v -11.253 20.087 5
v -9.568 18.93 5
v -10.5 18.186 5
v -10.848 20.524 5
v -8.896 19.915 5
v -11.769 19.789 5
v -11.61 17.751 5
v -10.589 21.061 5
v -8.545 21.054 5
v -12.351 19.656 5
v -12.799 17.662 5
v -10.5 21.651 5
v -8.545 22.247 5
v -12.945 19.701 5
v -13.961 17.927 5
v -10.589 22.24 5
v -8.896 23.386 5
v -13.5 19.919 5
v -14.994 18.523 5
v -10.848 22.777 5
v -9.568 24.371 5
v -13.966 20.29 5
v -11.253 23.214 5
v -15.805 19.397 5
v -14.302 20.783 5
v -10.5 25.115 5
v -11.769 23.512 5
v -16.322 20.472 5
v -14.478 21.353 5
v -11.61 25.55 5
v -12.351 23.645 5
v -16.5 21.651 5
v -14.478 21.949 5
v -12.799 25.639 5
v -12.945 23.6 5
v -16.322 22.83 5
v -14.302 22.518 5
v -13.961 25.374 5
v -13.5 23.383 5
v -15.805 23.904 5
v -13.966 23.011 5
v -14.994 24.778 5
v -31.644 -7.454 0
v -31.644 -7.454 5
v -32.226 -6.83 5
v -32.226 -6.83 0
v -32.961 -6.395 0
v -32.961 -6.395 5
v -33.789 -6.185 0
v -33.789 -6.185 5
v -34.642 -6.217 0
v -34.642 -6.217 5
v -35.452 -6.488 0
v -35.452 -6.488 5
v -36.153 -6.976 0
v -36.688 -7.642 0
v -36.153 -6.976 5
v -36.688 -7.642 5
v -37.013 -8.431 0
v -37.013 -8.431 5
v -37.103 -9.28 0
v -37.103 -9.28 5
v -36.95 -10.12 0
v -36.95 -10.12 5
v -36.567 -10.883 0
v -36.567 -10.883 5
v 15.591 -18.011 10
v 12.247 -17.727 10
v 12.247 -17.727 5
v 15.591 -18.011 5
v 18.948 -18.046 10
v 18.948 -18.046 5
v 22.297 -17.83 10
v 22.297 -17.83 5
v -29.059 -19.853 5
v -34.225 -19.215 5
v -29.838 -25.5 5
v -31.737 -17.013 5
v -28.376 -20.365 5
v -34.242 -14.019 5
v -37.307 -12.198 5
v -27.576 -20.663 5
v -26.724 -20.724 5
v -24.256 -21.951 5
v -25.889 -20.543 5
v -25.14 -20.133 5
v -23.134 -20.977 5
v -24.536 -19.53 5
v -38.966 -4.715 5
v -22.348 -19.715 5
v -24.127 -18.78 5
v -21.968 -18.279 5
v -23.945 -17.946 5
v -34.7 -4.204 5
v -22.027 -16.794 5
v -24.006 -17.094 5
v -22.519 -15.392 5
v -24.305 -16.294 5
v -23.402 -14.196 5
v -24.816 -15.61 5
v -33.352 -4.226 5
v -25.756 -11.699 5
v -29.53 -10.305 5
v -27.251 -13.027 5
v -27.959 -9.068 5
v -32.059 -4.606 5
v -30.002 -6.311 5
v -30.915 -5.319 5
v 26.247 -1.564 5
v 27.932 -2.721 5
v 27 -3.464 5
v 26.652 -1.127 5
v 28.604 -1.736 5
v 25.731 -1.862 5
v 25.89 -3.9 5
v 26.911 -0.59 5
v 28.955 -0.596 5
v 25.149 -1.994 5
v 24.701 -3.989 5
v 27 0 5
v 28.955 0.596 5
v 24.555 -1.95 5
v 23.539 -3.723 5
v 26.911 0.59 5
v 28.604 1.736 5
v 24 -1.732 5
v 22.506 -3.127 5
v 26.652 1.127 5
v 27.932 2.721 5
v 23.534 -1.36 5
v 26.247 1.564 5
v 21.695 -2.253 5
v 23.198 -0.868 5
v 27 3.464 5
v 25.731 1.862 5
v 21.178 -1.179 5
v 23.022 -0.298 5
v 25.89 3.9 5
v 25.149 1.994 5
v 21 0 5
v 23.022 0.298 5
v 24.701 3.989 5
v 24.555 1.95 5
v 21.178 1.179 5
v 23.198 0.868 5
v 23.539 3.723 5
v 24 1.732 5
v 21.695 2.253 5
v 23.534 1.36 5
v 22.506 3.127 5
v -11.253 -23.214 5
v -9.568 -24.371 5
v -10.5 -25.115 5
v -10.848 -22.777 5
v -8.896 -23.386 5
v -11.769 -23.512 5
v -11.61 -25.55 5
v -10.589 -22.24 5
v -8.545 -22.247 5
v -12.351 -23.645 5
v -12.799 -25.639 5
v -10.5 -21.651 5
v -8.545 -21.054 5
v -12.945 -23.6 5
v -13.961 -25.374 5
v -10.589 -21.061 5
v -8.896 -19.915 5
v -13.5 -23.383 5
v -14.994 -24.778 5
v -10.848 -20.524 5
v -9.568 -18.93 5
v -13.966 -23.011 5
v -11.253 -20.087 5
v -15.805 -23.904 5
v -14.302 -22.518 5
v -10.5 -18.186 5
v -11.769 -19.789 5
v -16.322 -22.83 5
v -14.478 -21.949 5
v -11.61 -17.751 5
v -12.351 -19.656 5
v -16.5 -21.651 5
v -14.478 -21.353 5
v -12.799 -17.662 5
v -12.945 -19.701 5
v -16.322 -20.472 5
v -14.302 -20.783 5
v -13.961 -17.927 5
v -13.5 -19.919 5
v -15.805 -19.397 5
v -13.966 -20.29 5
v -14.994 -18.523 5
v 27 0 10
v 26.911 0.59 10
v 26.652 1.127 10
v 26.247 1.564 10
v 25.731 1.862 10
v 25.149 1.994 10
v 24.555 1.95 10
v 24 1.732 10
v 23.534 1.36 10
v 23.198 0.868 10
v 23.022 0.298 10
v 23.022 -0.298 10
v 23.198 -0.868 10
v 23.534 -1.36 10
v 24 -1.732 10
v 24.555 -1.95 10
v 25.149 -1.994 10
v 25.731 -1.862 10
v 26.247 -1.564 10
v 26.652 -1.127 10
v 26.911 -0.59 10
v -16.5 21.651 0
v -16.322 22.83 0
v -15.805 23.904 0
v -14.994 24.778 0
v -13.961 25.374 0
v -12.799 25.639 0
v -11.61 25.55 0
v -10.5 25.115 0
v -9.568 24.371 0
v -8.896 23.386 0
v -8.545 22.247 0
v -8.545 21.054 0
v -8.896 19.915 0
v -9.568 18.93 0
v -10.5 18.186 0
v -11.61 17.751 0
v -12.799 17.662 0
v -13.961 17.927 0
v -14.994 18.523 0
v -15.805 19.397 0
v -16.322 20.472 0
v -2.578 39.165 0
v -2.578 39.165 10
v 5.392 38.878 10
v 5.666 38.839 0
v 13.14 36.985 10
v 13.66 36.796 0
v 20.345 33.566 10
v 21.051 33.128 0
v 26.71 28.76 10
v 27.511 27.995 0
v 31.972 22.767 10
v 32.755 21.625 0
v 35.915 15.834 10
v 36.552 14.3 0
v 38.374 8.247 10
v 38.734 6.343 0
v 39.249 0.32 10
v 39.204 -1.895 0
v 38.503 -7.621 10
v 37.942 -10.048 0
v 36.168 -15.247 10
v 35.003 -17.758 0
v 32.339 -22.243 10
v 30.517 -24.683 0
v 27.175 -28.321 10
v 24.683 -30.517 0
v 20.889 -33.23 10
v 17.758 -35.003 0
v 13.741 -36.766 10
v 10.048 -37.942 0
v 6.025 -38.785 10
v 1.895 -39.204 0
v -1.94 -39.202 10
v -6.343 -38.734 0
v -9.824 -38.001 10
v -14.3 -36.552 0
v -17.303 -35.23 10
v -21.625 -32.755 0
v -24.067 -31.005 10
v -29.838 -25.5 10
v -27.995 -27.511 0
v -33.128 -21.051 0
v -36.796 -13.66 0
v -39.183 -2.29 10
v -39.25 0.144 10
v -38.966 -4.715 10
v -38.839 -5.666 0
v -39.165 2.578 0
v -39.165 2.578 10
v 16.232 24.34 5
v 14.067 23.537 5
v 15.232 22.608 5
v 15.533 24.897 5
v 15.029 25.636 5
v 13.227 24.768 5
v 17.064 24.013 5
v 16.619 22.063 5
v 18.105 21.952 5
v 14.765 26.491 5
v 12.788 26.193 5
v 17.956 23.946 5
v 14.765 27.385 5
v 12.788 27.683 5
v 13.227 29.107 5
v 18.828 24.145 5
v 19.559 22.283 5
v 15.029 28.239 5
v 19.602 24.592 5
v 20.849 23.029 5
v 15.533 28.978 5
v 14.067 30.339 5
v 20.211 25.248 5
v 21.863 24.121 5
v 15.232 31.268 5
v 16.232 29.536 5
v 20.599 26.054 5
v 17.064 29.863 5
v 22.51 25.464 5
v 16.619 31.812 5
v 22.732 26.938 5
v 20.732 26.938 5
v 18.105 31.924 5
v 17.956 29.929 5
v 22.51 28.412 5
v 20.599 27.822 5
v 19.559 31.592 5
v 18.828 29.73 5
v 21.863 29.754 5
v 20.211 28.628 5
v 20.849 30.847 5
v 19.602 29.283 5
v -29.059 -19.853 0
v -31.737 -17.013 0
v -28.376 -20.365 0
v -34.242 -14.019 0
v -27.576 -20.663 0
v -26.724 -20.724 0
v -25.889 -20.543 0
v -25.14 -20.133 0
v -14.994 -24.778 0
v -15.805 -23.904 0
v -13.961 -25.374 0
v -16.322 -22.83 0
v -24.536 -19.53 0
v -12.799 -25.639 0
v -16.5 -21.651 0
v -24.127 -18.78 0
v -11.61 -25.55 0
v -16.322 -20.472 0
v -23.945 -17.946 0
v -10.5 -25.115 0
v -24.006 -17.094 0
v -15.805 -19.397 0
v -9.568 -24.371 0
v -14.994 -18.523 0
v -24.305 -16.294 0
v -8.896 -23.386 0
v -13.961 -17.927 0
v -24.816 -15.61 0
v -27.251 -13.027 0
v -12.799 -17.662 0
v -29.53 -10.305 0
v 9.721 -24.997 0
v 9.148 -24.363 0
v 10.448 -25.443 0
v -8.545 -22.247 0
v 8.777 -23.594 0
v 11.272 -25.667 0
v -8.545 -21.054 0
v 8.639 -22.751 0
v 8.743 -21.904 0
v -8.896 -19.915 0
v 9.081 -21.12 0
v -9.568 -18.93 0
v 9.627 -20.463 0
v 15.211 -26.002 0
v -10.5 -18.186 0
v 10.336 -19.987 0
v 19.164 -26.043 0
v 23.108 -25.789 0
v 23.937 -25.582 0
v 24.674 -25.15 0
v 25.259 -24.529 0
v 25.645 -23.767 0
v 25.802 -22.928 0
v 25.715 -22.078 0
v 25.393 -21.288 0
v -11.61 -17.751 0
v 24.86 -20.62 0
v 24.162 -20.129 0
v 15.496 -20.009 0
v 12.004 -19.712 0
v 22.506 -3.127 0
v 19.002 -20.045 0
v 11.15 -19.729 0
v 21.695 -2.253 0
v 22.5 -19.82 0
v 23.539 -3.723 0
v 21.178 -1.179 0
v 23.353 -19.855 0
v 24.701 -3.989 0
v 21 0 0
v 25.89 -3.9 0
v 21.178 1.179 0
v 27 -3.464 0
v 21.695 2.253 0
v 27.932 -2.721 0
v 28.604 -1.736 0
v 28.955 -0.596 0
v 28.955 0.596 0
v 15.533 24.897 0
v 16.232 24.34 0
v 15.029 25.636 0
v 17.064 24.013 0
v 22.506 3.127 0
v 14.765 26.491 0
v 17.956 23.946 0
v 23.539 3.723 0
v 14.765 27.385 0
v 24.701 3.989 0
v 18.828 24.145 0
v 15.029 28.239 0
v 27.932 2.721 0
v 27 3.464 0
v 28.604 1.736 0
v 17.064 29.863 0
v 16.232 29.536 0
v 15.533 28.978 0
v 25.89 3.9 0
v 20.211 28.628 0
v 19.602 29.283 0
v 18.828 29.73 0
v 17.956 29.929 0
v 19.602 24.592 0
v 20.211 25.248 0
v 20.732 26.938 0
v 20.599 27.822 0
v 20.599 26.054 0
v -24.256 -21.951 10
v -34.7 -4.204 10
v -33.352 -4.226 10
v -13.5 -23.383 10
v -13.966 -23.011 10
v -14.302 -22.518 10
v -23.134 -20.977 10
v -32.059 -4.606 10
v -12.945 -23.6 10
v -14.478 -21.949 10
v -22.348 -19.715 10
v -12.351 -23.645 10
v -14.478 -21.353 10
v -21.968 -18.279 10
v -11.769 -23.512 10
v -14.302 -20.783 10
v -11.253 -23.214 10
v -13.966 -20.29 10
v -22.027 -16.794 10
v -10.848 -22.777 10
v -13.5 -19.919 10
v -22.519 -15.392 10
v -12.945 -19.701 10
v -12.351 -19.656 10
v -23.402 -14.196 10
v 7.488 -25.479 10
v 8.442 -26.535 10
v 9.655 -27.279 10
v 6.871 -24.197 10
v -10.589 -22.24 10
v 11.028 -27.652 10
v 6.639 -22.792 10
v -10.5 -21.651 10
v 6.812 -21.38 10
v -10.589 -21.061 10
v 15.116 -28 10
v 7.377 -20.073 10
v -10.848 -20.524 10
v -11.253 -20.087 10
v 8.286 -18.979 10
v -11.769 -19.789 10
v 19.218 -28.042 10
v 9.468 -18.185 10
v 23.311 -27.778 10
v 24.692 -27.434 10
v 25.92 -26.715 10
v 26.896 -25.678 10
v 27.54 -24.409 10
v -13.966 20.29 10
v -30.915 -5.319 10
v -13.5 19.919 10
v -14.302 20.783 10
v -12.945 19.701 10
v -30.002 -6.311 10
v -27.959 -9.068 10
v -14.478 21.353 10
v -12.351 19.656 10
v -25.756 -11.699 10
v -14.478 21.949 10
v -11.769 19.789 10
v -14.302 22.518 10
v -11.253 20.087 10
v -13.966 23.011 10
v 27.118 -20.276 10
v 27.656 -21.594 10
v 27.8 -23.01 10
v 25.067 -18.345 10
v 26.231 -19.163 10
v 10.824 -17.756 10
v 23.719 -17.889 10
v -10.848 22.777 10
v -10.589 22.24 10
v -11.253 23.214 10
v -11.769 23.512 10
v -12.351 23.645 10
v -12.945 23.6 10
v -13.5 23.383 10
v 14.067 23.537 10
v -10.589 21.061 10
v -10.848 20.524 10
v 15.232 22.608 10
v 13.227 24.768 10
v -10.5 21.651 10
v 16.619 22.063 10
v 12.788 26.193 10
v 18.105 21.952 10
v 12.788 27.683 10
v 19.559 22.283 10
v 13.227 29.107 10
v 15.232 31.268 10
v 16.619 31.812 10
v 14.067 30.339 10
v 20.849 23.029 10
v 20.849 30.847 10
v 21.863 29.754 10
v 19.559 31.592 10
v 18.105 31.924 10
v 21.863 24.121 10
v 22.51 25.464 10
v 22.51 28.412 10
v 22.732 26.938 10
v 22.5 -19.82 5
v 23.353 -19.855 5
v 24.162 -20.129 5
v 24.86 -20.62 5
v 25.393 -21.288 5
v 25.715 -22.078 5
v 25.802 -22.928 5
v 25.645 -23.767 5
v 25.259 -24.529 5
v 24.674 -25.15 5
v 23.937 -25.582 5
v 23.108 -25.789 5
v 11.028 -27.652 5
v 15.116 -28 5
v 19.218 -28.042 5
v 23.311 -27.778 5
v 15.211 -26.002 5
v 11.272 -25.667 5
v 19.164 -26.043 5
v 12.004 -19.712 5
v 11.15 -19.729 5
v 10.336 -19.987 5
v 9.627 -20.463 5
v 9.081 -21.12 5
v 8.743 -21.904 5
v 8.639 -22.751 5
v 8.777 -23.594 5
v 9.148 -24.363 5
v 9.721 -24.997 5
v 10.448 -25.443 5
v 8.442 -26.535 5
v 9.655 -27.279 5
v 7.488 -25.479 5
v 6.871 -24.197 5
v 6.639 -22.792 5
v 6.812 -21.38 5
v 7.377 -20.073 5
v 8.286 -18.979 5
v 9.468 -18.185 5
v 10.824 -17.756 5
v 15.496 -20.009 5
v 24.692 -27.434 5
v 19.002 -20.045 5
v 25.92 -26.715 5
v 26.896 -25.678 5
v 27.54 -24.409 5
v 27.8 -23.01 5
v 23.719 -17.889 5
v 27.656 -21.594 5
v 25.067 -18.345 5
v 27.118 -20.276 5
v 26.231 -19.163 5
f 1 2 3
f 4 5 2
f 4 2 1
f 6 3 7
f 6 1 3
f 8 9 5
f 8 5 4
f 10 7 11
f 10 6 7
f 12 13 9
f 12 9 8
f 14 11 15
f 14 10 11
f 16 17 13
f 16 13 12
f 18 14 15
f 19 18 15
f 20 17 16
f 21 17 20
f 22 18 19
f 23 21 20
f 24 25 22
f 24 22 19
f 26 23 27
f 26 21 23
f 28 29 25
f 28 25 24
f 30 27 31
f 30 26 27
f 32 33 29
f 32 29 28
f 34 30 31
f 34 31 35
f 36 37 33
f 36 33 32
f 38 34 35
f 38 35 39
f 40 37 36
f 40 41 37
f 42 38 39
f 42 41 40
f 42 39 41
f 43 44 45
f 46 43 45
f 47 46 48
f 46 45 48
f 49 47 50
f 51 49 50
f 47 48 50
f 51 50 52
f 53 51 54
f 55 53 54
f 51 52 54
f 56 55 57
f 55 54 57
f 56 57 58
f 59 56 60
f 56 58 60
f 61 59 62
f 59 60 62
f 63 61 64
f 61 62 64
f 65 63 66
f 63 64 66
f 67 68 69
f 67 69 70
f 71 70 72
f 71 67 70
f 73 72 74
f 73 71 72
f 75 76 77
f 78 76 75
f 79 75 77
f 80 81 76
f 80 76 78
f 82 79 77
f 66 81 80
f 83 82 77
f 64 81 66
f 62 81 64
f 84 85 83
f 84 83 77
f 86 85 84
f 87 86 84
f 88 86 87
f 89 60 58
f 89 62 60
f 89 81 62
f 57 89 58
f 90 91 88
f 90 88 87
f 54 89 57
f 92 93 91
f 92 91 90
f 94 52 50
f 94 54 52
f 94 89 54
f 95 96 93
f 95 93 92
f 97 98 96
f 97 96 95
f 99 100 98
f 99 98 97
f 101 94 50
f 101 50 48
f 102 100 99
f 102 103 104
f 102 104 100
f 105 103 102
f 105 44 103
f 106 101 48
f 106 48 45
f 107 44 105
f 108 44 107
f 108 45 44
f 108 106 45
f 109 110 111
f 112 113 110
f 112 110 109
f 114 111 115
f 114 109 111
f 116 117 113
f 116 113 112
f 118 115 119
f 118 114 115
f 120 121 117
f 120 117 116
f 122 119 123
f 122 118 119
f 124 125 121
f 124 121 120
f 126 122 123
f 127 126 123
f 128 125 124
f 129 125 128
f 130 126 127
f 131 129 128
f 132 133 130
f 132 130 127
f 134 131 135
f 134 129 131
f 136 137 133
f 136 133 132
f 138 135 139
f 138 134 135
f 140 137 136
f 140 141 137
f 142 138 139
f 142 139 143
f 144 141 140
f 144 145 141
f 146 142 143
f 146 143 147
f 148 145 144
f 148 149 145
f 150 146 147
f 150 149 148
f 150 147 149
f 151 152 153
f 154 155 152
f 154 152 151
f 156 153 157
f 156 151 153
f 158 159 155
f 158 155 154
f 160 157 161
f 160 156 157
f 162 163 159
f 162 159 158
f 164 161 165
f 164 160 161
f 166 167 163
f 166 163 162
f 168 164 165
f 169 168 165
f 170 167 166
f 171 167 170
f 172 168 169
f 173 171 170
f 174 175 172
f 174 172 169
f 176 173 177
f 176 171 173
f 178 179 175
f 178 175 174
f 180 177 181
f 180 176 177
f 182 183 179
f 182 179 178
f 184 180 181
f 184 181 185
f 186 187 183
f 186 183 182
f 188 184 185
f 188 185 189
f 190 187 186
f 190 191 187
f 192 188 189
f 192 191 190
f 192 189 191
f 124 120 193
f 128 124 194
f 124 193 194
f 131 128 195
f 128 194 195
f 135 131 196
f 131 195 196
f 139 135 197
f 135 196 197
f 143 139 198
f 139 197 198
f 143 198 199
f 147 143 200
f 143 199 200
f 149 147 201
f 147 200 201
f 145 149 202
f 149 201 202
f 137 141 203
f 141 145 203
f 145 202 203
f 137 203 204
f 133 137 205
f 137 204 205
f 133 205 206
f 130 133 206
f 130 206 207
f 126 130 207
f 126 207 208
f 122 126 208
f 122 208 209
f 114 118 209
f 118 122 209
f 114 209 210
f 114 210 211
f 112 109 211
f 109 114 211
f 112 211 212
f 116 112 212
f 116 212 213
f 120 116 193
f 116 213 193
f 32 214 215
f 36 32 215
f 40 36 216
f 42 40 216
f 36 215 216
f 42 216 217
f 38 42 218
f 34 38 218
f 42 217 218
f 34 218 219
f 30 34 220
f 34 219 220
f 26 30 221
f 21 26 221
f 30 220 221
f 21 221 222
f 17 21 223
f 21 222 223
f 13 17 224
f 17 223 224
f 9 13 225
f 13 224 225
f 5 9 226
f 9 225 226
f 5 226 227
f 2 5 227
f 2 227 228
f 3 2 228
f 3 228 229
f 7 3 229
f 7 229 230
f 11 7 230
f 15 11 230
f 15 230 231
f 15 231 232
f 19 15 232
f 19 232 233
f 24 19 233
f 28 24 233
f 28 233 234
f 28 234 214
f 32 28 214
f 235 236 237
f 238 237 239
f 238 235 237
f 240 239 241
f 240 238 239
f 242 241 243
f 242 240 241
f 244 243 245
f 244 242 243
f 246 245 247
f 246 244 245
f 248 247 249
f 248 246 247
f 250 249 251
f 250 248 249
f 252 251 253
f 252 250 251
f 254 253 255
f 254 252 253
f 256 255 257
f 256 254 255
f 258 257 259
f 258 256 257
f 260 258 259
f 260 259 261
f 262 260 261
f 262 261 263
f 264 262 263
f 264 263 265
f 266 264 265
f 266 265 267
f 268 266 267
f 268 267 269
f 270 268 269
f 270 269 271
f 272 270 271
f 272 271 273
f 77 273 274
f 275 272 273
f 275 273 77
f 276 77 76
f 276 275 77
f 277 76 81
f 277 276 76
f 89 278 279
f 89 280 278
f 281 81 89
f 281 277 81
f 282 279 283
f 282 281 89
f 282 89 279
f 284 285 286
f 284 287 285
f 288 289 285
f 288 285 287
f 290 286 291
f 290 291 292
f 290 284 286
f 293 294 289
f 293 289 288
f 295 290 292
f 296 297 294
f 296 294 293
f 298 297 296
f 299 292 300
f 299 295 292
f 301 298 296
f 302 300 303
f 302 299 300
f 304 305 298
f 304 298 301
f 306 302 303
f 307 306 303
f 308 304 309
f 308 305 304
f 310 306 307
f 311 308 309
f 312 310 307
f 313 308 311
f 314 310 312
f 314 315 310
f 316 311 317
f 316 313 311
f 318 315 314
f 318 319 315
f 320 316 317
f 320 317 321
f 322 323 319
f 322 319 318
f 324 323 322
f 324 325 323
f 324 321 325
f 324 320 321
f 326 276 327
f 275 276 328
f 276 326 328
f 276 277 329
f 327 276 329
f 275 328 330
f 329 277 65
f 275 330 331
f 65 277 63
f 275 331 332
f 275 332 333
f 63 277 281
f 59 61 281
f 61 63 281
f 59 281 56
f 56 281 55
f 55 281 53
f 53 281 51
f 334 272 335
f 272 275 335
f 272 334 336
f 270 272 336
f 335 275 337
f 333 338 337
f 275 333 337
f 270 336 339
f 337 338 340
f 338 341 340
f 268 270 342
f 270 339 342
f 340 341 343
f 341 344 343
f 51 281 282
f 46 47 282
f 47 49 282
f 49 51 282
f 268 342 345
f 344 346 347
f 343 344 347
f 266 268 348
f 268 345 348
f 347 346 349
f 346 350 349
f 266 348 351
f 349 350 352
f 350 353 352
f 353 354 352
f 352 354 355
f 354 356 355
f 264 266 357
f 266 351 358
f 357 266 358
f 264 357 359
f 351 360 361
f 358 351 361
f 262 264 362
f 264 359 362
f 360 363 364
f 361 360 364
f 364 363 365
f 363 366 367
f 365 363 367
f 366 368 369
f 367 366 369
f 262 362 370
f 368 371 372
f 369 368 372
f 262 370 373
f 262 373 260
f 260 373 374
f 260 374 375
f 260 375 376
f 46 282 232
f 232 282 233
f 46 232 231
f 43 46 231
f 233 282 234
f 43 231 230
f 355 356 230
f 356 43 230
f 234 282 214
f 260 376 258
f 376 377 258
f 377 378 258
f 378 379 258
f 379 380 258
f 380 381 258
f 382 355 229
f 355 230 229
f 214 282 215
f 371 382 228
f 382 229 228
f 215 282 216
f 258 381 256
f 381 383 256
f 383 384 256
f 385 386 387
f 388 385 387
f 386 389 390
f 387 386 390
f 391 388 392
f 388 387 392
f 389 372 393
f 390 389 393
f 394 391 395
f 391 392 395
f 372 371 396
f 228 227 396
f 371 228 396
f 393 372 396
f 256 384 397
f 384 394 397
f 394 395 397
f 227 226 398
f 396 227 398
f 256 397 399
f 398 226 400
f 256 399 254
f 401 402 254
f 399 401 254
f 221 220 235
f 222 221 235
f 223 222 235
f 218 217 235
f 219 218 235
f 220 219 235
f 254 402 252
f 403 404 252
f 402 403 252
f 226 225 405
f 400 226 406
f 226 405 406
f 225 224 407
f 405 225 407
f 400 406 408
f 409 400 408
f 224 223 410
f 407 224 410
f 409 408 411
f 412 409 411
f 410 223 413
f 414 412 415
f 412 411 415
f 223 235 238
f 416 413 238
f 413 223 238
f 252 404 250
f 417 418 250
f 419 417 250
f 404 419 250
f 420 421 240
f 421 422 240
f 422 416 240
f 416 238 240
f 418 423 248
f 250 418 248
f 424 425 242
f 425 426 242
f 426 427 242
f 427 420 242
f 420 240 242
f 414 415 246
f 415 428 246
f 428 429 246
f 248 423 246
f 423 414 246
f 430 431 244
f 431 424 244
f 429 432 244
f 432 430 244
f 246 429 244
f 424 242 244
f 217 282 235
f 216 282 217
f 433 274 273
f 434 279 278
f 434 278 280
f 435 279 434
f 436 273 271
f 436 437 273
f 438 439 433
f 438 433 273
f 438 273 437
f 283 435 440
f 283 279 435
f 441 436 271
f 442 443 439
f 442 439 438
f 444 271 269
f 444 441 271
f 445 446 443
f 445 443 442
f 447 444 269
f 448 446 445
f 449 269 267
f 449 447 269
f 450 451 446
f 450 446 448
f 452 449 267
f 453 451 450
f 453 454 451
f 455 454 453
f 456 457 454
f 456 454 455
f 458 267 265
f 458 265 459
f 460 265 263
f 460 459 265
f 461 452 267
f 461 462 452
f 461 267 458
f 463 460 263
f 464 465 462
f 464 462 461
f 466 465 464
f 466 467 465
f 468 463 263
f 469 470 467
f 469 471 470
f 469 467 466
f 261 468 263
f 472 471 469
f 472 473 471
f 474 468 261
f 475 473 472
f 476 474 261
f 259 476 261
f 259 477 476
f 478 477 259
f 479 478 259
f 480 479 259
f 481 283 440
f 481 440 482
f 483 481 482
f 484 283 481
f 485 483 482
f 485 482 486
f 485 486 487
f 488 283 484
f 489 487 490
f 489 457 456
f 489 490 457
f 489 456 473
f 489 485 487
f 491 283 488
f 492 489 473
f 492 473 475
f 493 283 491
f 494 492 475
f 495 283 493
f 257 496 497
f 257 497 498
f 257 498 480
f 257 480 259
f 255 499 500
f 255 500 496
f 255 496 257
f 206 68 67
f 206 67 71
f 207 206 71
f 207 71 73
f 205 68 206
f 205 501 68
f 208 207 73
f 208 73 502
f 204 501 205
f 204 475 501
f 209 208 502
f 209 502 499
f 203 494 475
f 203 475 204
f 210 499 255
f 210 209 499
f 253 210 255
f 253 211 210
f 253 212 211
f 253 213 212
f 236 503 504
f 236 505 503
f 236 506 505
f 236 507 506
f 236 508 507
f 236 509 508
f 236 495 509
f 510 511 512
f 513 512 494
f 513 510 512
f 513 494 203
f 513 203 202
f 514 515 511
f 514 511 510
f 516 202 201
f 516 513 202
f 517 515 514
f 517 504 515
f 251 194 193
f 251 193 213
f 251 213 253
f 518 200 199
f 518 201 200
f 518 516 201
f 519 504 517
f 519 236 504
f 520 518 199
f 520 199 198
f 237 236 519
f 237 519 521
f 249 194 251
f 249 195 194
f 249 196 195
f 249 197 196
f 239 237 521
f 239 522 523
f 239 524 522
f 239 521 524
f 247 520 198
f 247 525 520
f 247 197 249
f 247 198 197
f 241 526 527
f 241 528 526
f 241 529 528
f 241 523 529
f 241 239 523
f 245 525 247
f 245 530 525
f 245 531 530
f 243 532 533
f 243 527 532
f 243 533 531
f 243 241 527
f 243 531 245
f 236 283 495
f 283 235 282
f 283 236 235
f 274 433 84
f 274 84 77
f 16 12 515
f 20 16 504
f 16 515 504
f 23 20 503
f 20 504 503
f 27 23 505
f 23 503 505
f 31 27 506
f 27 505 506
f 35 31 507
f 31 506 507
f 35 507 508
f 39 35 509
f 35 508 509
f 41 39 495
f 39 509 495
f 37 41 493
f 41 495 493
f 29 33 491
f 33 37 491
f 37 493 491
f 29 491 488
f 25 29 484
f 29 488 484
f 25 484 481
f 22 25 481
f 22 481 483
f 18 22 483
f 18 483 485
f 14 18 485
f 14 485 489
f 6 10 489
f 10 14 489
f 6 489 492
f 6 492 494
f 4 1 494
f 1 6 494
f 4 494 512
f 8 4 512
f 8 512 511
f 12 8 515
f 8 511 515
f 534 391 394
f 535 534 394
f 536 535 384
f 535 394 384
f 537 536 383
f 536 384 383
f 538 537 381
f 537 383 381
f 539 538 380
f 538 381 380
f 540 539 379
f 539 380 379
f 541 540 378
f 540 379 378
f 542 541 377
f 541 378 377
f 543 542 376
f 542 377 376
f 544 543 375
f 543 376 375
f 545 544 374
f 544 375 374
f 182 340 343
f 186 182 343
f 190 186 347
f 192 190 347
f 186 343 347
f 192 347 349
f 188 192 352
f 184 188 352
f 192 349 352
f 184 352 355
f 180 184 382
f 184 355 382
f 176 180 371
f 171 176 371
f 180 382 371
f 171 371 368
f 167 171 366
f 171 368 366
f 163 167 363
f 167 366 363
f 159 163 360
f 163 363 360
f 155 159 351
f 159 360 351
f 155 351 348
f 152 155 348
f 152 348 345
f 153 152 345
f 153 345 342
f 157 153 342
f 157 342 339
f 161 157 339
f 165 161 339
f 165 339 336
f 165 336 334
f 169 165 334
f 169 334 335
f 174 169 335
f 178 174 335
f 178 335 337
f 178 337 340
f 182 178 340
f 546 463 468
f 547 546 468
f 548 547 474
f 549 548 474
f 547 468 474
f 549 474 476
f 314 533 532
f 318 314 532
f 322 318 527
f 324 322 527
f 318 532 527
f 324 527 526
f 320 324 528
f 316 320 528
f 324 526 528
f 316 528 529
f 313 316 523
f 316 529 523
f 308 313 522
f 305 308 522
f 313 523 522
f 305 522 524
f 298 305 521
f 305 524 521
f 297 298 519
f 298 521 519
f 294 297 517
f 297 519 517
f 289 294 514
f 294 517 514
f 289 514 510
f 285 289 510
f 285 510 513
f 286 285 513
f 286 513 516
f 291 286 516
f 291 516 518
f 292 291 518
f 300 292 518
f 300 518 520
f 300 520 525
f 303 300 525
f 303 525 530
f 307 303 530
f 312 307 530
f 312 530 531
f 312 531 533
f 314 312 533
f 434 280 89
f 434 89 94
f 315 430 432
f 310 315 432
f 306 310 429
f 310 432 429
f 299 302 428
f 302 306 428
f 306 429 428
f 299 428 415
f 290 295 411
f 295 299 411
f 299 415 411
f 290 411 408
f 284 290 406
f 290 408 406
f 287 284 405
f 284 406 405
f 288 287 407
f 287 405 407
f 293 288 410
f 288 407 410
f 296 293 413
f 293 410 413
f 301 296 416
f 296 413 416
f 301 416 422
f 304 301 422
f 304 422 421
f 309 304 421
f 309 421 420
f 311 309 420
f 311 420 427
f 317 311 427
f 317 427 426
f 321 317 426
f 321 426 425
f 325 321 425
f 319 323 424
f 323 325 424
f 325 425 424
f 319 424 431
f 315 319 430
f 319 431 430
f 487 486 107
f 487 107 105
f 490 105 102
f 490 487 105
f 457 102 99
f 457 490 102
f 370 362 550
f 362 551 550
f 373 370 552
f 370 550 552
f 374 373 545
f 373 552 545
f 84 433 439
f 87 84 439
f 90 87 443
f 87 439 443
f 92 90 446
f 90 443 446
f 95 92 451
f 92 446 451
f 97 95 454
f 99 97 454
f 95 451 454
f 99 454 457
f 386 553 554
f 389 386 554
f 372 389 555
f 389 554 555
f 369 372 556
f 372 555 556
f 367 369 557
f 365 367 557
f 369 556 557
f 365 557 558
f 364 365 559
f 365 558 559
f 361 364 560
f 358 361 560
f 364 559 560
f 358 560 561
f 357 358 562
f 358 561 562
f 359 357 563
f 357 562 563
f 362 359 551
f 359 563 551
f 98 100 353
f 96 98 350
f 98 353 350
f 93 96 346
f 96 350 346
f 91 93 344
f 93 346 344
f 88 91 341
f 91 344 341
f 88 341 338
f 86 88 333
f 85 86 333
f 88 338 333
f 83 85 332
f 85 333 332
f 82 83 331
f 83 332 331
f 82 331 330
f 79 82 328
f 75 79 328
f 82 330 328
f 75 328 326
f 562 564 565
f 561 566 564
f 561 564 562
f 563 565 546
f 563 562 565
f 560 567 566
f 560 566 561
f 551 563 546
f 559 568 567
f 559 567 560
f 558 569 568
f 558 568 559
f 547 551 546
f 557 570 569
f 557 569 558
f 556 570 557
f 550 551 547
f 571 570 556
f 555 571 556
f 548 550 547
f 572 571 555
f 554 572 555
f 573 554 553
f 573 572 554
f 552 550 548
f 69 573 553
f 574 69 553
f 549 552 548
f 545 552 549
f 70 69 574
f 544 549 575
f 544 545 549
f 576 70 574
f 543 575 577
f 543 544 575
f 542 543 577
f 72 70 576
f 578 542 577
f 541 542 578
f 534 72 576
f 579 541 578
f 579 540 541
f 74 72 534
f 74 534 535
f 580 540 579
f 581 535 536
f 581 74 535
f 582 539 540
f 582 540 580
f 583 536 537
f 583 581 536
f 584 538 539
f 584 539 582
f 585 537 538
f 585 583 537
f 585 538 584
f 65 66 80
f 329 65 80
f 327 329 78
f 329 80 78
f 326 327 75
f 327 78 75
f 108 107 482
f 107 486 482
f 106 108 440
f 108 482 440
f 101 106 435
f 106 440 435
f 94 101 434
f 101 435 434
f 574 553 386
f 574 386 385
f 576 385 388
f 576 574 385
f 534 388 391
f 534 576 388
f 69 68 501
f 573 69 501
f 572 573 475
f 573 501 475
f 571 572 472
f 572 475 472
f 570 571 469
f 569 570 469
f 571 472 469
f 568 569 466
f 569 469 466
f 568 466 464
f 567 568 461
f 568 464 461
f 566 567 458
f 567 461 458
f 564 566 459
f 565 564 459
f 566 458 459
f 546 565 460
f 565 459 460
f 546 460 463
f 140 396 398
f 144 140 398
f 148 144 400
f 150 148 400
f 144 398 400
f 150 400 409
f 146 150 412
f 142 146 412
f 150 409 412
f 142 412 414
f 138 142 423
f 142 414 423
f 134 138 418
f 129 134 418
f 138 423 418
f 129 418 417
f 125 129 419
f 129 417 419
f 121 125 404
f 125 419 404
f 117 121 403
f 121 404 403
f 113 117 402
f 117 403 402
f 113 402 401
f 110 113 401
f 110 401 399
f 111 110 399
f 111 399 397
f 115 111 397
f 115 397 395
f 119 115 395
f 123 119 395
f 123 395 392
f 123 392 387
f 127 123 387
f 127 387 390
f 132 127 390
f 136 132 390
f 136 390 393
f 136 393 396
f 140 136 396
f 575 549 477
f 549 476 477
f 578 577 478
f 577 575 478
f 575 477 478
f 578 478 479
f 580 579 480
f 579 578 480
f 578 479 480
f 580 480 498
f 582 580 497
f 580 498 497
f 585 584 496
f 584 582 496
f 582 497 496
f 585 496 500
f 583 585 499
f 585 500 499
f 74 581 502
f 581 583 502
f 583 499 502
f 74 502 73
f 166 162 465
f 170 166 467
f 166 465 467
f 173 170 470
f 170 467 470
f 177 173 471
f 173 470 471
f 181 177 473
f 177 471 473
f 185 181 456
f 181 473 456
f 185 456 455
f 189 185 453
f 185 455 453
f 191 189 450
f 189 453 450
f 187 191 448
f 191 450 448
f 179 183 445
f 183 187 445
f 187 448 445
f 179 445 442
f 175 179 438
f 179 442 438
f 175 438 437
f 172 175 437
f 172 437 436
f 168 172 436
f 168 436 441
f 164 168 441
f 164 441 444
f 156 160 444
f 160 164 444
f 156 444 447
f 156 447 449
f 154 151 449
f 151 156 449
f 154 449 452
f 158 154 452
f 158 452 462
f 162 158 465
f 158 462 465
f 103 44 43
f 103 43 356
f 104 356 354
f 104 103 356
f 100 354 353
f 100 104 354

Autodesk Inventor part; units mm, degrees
ref_plane "YZ Plane" through (0, 0, 0) normal (1, 0, 0) x (0, 1, 0)
ref_plane "XZ Plane" through (0, 0, 0) normal (0, 1, 0) x (-1, 0, 0)
ref_plane "XY Plane" through (0, 0, 0) normal (0, 0, 1) x (1, 0, 0)
sketch "Sketch1" plane through (0, 0, 0) normal (0, 0, 1) x (1, 0, 0)
  arc A0 (-39.1074, 3.3431) -> (-3.3431, 39.1074) centre (0, 0) ccw
  line L0 (0, 0) -> (30.017, 0) construction
  line L1 (-39.1074, 3.3431) -> (-3.3431, 39.1074)
  line L2 (0, 0) -> (39.25, 0) construction
  circle A1 centre (22.8042, -22.8042) radius 3
  circle A2 centre (-26.9378, -17.7318) radius 3
  circle A3 centre (17.7318, 26.9378) radius 3
  dimension "d0" = 78.5
  dimension "d6" = 6
  dimension "d9" = 6
  dimension "d10" = 6
extrude "Extrusion1" add sketch "Sketch1" along normal blind 10
sketch "Sketch2" plane through (0, 0, 10) normal (0, 0, 1) x (1, 0, 0)
  circle A0 centre (17.7318, 26.9378) radius 3 projected
  circle A1 centre (17.7318, 26.9378) radius 5
  circle A2 centre (22.8042, -22.8042) radius 3 projected
  circle A3 centre (22.8042, -22.8042) radius 5
  circle A4 centre (-26.9378, -17.7318) radius 3 projected
  circle A5 centre (-26.9378, -17.7318) radius 5
  point P0 (0, 0)
  dimension "d13" = 10
  dimension "d14" = 10
  dimension "d15" = 10
extrude "Extrusion2" cut sketch "Sketch2" against normal blind 5 contours A1
extrude "Extrusion3" cut sketch "Sketch2" against normal blind 5 contours A5
extrude "Extrusion4" cut sketch "Sketch2" against normal blind 5 contours A3
sketch "Sketch3" plane through (0, 0, 10) normal (0, 0, 1) x (1, 0, 0)
  line L0 (0, 0) -> (25, 0) construction
  circle A0 centre (-12.5, -21.6506) radius 2
  arc A1 (-39.1074, 3.3431) -> (-3.3431, 39.1074) centre (0, 0) ccw projected
  circle A2 centre (25, 0) radius 2
  circle A3 centre (-12.5, 21.6506) radius 2
  dimension "d24" = 4
  dimension "d27" = 360
extrude "Extrusion5" cut sketch "Sketch3" against normal through all contours A0
extrude "Extrusion6" cut sketch "Sketch3" against normal through all contours A2
extrude "Extrusion7" cut sketch "Sketch3" against normal through all contours A3
sketch "Sketch4" plane through (0, 0, 0) normal (0, 0, -1) x (-1, 0, 0)
  circle A0 centre (12.5, 21.6506) radius 2 projected
  circle A1 centre (12.5, 21.6506) radius 4
  circle A2 centre (-25, 0) radius 2 projected
  circle A3 centre (-25, 0) radius 4
  circle A4 centre (12.5, -21.6506) radius 2 projected
  circle A5 centre (12.5, -21.6506) radius 4
  point P0 (0, 0)
  dimension "d35" = 8
  dimension "d36" = 8
  dimension "d37" = 8
extrude "Extrusion8" cut sketch "Sketch4" against normal blind 5 contours A1
extrude "Extrusion9" cut sketch "Sketch4" against normal blind 5 contours A5
extrude "Extrusion10" cut sketch "Sketch4" against normal blind 5 contours A3
sketch "Sketch5" plane through (0, 0, 10) normal (0, 0, 1) x (1, 0, 0)
  circle A0 centre (17.7318, 26.9378) radius 3 projected
  circle A1 centre (22.8042, -22.8042) radius 3 projected
  circle A2 centre (-26.9378, -17.7318) radius 5 projected
  arc A3 (12.2473, -17.7267) -> (11.0285, -27.6521) centre (11.6379, -22.6894) ccw
  arc A4 (-39.1074, 3.3431) -> (-3.3431, 39.1074) centre (0, 0) ccw projected
  arc A5 (-30.0025, -6.3107) -> (-23.4023, -14.1962) centre (17.7318, 26.9378) ccw
  line L0 (-38.9658, -4.7151) -> (-34.7002, -4.204)
  line L1 (-24.2556, -21.9514) -> (-29.8381, -25.5)
  circle A6 centre (-26.9378, -17.7318) radius 5 projected
  arc A7 (-30.0025, -6.3107) -> (-34.7002, -4.204) centre (-34.1053, -9.1685) ccw
  arc A8 (12.2473, -17.7267) -> (22.2969, -17.83) centre (17.7318, 26.9378) ccw
  arc A9 (11.0285, -27.6521) -> (23.3114, -27.7784) centre (17.7318, 26.9378) ccw
  circle A10 centre (22.8042, -22.8042) radius 5 projected
  dimension "d46" = 10
extrude "Extrusion11" cut sketch "Sketch5" against normal blind 5 contours A2 L1 A4 L0 A7 A5
extrude "Extrusion12" cut sketch "Sketch5" against normal blind 5 contours A8 A10 A9 A3 | A10
sketch "Sketch6" plane through (0, 0, 5) normal (0, 0, 1) x (1, 0, 0)
  circle A0 centre (17.7318, 26.9378) radius 3 projected
  circle A1 centre (22.8042, -22.8042) radius 3 projected
  circle A2 centre (-26.9378, -17.7318) radius 3 projected
  arc A3 (12.0035, -19.7118) -> (22.4998, -19.8197) centre (17.7318, 26.9378) ccw
  arc A4 (11.2723, -25.6671) -> (23.1085, -25.7887) centre (17.7318, 26.9378) ccw
  arc A5 (12.2473, -17.7267) -> (11.0285, -27.6521) centre (11.6379, -22.6894) ccw projected
  arc A6 (12.0035, -19.7118) -> (11.2723, -25.6671) centre (11.6379, -22.6894) ccw
  arc A7 (-31.6436, -7.4538) -> (-24.8165, -15.6104) centre (17.7318, 26.9378) ccw
  arc A8 (-36.567, -10.8831) -> (-29.0592, -19.8531) centre (17.7318, 26.9378) ccw
  arc A9 (-30.0025, -6.3107) -> (-34.7002, -4.204) centre (-34.1053, -9.1685) ccw projected
  arc A10 (-31.6436, -7.4538) -> (-36.567, -10.8831) centre (-34.1053, -9.1685) ccw
  point P0 (0, 0)
  dimension "d69" = 106
  dimension "d70" = 6
  dimension "d71" = 6
extrude "Extrusion13" cut sketch "Sketch6" against normal blind 5 contours A1 A4 A6 A3
extrude "Extrusion14" cut sketch "Sketch6" against normal blind 5 contours A2 | A2 A8 A10 A7
sketch "Sketch7" plane through (0, 0, 10) normal (0, 0, 1) x (1, 0, 0)
  line L0 (-3.3431, 39.1074) -> (-39.1074, 3.3431) projected
  arc A0 (-29.8381, -25.5) -> (-3.3431, 39.1074) centre (0, 0) ccw projected
  line L1 (-2.5781, 39.1652) -> (-39.1652, 2.5781)
  line L2 (-2.5781, 39.1652) -> (49.1639, 39.1652) construction
  arc A1 (-39.1074, 3.3431) -> (-38.9658, -4.7151) centre (0, 0) ccw projected
  dimension "d77" = 135
extrude "Extrusion15" cut sketch "Sketch7" against normal blind 10
properties part number "Encoder Mount Base"
